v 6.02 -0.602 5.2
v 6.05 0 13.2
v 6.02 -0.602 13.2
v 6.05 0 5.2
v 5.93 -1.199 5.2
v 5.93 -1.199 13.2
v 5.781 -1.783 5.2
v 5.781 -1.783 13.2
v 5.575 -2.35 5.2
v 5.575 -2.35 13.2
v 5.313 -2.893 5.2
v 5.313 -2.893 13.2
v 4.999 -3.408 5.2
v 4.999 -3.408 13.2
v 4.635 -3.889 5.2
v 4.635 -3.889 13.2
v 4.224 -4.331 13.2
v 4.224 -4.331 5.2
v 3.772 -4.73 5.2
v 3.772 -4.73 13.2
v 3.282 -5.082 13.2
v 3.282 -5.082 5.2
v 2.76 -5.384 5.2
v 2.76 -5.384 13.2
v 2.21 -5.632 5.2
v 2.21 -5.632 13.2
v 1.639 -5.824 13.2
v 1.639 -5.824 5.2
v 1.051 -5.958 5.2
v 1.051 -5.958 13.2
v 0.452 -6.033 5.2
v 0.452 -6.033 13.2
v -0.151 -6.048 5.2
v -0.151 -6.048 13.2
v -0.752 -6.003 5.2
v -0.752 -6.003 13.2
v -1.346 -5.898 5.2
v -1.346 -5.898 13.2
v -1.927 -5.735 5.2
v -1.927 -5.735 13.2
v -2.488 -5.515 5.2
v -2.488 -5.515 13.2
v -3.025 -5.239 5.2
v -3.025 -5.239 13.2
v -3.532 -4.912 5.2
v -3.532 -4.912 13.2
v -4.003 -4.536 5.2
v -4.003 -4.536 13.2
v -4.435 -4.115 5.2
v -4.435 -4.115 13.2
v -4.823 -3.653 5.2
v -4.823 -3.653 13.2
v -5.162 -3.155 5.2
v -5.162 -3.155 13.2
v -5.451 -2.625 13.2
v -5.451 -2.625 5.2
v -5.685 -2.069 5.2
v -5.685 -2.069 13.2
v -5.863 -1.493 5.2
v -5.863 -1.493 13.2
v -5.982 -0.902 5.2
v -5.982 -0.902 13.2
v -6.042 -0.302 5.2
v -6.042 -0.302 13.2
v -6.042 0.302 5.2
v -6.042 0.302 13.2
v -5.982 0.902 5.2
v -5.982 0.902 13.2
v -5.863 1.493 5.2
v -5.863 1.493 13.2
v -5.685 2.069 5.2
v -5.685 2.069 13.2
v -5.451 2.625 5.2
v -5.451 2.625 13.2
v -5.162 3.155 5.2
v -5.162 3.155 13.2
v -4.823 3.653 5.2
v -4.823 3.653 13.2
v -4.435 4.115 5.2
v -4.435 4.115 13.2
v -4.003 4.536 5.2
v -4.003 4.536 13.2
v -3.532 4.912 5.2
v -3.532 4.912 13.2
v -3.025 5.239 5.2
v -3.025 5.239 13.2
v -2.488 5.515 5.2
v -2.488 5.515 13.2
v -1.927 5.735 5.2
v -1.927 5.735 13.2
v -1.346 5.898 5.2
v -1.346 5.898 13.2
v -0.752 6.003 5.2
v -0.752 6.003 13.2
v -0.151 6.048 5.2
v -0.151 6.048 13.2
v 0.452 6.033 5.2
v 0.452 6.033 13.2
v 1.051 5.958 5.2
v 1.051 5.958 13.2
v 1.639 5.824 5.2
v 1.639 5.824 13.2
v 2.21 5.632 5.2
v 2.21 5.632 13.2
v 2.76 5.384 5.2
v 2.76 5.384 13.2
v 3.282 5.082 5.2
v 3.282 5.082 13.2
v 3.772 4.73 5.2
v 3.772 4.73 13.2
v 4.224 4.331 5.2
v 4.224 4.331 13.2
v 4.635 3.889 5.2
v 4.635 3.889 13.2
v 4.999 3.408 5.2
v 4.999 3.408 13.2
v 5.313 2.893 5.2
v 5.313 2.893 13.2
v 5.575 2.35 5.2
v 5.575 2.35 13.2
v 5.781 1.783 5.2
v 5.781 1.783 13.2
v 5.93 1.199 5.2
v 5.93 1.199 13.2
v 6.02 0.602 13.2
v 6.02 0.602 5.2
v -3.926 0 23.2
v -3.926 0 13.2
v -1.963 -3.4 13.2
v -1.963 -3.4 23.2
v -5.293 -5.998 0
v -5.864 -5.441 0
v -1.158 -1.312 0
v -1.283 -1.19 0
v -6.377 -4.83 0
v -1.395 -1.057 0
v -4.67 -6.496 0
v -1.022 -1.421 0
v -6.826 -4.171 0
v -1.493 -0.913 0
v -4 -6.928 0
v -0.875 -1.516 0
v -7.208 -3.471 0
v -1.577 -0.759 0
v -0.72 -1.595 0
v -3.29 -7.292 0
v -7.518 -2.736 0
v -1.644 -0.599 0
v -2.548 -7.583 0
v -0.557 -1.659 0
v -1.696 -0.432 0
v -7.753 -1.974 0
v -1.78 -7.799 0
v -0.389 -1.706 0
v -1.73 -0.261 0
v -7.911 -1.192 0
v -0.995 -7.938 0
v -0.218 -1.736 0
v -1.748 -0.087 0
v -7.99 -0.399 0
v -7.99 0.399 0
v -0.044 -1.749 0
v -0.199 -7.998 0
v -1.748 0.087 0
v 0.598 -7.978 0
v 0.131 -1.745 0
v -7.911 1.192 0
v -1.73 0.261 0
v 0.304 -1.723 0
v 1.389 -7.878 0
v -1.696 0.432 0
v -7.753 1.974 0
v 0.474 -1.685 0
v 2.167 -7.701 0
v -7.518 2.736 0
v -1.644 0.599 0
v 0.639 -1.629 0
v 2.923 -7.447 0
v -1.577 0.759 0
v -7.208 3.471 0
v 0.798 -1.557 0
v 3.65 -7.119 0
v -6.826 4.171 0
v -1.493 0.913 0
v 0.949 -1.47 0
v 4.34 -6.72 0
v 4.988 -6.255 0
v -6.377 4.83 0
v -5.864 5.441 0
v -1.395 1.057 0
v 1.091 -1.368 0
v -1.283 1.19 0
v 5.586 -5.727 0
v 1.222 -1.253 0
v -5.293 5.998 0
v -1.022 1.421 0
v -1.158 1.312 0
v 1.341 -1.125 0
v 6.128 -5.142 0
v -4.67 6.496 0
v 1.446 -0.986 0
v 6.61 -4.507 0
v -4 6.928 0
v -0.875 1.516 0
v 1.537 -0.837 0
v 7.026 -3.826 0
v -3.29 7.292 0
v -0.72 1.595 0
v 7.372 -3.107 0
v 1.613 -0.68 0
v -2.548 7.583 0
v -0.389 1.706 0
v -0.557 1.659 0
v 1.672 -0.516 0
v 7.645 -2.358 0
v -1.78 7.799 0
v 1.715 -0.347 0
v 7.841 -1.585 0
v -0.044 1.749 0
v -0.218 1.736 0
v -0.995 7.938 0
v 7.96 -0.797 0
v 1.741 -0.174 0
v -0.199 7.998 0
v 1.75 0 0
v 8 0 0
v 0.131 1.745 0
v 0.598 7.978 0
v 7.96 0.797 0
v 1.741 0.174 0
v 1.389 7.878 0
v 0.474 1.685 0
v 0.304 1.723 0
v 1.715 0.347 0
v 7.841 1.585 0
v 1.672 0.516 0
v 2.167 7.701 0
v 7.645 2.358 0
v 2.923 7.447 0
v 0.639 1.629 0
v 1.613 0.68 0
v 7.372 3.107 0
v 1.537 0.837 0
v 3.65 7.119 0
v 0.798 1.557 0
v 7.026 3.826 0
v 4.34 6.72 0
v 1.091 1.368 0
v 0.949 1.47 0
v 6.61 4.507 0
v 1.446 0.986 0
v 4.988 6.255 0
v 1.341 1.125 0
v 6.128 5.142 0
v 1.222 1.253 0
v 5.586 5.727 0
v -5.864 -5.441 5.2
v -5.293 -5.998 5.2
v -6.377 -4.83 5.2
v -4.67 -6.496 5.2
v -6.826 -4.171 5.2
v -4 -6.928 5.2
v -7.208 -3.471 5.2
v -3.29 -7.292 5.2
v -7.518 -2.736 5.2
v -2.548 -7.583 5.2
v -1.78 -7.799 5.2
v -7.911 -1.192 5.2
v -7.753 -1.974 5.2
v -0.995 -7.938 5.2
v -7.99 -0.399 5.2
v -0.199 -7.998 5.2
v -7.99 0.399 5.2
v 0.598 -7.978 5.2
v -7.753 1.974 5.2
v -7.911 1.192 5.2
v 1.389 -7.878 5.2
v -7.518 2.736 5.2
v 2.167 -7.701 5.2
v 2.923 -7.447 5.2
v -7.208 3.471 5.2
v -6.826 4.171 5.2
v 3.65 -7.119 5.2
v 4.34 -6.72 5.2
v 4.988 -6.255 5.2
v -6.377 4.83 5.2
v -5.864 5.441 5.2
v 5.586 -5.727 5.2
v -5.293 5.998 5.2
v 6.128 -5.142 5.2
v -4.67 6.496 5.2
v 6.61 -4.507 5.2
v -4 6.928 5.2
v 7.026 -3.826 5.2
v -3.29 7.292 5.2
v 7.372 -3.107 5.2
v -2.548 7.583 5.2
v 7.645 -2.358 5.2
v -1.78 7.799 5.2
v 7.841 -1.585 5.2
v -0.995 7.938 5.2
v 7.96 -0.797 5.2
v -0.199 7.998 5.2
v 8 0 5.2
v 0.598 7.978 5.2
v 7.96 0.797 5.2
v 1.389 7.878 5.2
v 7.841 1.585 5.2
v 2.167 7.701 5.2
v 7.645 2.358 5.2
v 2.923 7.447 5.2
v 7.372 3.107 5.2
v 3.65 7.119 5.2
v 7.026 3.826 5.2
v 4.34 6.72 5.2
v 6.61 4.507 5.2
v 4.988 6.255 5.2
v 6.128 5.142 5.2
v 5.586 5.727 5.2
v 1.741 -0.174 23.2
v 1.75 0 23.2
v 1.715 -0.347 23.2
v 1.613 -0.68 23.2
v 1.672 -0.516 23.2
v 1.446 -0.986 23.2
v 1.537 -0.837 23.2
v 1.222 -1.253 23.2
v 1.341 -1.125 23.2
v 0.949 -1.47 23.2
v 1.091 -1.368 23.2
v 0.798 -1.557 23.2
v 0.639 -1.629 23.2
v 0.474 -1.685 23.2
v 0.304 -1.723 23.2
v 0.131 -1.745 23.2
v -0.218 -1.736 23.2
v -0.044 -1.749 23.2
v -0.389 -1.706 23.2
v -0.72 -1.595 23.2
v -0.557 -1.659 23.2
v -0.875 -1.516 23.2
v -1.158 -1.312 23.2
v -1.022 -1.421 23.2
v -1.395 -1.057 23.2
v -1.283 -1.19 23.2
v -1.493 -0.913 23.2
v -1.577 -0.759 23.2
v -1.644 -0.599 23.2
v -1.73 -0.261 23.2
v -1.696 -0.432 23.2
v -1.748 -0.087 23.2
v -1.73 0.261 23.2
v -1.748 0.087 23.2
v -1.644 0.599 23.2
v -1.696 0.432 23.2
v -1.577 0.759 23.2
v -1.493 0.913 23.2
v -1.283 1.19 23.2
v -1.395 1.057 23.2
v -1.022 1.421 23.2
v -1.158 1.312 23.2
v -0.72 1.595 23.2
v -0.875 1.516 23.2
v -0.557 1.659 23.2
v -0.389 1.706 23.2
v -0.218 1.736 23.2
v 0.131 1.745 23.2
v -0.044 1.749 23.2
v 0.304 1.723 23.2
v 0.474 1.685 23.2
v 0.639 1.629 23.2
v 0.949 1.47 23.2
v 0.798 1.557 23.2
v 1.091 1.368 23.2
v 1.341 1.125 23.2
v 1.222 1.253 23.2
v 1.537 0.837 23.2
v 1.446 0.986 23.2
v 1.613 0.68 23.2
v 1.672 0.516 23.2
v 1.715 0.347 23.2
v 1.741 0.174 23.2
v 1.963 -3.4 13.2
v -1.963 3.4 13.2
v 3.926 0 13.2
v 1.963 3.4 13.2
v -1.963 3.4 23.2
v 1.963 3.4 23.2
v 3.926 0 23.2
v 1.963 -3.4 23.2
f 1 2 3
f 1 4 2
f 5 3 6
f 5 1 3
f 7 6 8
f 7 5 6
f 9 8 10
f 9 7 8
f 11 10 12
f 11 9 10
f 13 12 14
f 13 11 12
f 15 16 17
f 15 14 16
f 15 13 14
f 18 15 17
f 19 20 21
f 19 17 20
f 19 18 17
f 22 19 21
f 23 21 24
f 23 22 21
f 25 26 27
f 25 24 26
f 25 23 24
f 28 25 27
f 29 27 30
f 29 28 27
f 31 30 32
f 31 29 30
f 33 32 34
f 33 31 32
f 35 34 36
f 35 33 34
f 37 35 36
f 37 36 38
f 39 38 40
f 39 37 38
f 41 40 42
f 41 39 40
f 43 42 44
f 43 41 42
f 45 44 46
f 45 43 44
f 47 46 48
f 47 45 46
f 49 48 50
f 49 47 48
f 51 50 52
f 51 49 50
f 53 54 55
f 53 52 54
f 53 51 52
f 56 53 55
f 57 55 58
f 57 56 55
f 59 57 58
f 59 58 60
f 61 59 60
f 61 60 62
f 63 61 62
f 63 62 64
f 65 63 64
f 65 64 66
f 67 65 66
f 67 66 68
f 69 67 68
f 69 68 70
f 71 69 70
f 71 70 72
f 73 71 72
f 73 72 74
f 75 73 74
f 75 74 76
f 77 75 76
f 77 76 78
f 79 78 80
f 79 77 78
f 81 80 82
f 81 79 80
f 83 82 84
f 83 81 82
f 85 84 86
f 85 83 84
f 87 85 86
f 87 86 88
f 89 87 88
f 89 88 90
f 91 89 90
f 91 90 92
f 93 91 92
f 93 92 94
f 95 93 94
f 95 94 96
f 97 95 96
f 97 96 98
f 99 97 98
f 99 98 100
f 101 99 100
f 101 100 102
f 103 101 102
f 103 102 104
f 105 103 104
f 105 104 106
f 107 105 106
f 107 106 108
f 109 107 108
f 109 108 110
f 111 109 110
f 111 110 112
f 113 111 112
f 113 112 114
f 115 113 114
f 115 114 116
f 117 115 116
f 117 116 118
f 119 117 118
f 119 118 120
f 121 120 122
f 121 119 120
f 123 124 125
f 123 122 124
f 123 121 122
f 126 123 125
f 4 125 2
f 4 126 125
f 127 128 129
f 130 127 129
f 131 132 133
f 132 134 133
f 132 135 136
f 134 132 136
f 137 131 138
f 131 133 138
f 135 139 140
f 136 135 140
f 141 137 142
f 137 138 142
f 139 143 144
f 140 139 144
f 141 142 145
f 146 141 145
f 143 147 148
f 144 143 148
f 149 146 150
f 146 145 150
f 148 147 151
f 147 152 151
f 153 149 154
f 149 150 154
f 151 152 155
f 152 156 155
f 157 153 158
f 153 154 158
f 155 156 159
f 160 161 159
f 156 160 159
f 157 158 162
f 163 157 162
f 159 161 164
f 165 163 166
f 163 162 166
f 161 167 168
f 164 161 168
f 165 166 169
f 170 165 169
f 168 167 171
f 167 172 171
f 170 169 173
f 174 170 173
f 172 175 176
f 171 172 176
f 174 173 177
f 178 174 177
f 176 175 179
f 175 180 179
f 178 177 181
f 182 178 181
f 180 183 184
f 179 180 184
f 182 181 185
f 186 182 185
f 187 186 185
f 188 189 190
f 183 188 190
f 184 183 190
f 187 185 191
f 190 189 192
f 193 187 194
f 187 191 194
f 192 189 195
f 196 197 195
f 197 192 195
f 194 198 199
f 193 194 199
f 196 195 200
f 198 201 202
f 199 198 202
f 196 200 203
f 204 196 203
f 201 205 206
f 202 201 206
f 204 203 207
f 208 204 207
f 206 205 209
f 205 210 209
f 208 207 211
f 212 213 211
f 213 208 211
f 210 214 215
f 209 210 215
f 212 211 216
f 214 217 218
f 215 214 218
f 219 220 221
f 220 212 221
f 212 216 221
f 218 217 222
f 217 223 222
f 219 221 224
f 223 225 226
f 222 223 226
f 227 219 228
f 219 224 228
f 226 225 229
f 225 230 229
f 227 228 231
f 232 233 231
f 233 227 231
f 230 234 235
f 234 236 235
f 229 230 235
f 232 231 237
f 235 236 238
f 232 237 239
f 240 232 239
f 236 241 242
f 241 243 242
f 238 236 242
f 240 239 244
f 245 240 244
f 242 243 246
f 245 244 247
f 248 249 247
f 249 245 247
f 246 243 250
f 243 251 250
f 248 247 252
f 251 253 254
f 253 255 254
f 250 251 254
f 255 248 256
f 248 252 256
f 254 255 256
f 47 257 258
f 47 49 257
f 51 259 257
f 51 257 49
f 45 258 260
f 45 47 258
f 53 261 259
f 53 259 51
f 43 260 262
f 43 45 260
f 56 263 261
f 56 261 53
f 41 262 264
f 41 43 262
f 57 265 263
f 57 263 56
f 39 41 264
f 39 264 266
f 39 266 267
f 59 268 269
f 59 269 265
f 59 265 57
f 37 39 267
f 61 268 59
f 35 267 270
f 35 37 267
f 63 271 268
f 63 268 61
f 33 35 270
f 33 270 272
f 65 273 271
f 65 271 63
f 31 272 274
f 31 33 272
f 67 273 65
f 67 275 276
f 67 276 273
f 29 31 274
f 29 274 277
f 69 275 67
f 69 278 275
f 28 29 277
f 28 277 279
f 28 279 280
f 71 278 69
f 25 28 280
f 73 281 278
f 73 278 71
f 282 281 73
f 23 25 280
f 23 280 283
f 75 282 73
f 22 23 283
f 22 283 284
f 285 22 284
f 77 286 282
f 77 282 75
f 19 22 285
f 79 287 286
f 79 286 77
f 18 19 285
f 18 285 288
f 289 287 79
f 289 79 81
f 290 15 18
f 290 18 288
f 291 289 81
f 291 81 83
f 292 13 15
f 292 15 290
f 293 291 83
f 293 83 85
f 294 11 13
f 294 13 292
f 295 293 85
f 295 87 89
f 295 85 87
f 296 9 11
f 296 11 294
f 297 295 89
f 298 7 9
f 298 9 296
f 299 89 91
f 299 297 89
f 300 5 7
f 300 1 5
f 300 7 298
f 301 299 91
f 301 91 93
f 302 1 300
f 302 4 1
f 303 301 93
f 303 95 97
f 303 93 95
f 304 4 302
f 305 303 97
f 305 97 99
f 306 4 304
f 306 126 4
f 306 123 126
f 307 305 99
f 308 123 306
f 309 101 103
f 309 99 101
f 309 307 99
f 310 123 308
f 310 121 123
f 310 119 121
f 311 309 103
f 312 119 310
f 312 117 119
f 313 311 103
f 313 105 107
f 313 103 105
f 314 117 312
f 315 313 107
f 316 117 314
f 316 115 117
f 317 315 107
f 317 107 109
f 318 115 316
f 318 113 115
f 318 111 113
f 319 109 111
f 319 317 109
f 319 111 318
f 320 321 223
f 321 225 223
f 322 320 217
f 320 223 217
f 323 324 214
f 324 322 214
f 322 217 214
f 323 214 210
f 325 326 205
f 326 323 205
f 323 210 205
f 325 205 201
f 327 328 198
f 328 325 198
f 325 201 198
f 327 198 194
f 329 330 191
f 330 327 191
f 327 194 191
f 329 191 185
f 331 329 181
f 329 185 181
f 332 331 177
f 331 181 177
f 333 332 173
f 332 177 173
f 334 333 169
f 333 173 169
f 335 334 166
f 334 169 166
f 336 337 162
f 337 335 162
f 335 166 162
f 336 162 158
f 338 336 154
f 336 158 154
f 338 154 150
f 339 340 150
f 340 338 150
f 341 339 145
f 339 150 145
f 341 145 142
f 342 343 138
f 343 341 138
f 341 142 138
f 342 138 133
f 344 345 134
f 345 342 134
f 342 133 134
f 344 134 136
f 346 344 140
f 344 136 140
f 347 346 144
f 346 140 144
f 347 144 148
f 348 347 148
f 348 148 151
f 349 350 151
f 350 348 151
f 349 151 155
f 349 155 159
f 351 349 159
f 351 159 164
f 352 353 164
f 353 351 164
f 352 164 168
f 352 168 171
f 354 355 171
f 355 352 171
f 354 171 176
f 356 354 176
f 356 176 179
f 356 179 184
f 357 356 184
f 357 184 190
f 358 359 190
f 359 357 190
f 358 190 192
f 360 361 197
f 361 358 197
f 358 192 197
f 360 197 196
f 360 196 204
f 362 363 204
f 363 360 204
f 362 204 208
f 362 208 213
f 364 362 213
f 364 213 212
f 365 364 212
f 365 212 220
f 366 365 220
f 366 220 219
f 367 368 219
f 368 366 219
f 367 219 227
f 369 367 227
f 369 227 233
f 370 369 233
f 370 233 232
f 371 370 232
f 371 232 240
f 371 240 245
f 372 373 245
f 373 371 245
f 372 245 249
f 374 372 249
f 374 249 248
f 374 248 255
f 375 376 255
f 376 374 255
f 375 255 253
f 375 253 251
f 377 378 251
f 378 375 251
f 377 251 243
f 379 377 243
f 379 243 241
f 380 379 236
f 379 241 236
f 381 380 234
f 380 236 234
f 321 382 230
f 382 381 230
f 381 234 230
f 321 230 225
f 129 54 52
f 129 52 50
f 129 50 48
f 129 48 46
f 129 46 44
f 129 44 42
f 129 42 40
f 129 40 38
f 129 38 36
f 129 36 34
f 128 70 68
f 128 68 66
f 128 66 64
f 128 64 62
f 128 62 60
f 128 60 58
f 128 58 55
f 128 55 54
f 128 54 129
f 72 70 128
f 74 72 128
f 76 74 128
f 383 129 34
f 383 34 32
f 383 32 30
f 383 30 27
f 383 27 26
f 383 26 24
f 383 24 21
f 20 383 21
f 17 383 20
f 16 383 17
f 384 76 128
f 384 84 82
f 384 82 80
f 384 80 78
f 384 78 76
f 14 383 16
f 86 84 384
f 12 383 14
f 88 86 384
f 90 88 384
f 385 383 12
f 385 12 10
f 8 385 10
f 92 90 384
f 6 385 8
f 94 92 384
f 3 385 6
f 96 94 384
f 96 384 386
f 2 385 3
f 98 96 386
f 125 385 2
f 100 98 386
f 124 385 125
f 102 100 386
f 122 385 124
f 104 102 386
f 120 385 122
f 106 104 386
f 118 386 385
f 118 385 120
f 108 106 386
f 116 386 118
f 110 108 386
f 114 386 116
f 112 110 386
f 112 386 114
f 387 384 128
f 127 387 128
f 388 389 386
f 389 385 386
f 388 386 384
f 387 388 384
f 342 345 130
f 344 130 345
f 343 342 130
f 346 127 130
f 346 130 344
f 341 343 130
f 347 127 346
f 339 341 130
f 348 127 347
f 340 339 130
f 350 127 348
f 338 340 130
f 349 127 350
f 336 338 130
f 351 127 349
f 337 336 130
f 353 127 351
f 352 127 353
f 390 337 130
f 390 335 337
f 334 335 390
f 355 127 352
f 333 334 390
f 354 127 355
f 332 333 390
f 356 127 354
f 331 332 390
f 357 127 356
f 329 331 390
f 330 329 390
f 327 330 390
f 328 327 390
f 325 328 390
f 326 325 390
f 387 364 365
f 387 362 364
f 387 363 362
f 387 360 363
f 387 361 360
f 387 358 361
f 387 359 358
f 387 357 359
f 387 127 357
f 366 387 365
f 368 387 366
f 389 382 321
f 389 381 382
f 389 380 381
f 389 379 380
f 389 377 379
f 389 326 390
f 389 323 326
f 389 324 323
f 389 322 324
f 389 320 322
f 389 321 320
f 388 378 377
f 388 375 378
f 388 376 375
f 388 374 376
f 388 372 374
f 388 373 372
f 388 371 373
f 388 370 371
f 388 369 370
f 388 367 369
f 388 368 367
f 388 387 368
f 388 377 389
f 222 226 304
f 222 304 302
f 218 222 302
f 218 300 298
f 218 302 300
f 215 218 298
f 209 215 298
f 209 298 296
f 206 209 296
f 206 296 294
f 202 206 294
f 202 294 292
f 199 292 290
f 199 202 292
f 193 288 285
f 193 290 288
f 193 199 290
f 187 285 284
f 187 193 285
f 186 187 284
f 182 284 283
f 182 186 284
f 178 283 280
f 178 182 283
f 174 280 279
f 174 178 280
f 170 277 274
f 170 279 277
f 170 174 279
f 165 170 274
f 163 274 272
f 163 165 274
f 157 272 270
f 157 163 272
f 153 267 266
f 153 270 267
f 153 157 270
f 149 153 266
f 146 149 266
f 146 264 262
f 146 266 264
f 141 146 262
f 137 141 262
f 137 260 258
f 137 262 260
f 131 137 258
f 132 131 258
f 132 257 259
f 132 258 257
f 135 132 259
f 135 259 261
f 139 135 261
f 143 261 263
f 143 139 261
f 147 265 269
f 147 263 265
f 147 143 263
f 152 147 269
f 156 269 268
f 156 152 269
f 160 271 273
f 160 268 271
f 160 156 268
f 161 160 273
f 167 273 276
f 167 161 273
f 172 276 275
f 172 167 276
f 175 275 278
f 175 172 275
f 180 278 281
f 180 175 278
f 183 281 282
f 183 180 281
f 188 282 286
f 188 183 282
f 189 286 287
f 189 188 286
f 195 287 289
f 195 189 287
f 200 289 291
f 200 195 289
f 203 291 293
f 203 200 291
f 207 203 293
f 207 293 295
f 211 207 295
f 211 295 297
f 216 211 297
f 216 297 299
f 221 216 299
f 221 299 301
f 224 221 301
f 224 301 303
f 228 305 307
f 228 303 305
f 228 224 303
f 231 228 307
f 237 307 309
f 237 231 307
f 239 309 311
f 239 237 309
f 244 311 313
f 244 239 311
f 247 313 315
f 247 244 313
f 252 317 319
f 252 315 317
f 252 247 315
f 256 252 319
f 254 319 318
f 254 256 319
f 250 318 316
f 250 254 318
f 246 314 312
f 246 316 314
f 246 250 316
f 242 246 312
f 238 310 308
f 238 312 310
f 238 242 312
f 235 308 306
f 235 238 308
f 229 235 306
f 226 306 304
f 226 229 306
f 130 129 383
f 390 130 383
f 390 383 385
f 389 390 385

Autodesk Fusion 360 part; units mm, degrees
sketch "Sketch2" plane through (0, 0, 0) normal (0, 0, 1) x (1, 0, 0)
  circle A0 centre (0, 0) radius 9
  circle A1 centre (0, 0) radius 8
  circle A2 centre (0, 0) radius 1.75
  dimension "d10" = 16
  dimension "d26" = 3.5
extrude "Extrude3" add sketch "Sketch2" along normal blind 5.2 contours A1
sketch "Sketch3" plane through (0, 0, 5.2) normal (0, 0, 1) x (1, 0, 0)
  circle A0 centre (0, 0) radius 6.05
  circle A1 centre (0, 0) radius 8
  circle A2 centre (0, 0) radius 1.75
  dimension "d13" = 12.1
extrude "Extrude4" add sketch "Sketch3" along normal blind 8 contours A0
sketch "Sketch4" plane through (0, 0, 13.2) normal (0, 0, 1) x (1, 0, 0)
  circle A0 centre (0, 0) radius 6.05
  line L0 (-1.963, 3.4) -> (-3.926, 0)
  line L1 (-3.926, 0) -> (-1.963, -3.4)
  line L2 (-1.963, -3.4) -> (1.963, -3.4)
  line L3 (1.963, -3.4) -> (3.926, 0)
  line L4 (3.926, 0) -> (1.963, 3.4)
  line L5 (1.963, 3.4) -> (-1.963, 3.4)
  circle A1 centre (0, 0) radius 1.75
  dimension "d24" = 6.8
extrude "Extrude5" add sketch "Sketch4" along normal blind 10 contours L0 L1 L2 L3 L4 L5
